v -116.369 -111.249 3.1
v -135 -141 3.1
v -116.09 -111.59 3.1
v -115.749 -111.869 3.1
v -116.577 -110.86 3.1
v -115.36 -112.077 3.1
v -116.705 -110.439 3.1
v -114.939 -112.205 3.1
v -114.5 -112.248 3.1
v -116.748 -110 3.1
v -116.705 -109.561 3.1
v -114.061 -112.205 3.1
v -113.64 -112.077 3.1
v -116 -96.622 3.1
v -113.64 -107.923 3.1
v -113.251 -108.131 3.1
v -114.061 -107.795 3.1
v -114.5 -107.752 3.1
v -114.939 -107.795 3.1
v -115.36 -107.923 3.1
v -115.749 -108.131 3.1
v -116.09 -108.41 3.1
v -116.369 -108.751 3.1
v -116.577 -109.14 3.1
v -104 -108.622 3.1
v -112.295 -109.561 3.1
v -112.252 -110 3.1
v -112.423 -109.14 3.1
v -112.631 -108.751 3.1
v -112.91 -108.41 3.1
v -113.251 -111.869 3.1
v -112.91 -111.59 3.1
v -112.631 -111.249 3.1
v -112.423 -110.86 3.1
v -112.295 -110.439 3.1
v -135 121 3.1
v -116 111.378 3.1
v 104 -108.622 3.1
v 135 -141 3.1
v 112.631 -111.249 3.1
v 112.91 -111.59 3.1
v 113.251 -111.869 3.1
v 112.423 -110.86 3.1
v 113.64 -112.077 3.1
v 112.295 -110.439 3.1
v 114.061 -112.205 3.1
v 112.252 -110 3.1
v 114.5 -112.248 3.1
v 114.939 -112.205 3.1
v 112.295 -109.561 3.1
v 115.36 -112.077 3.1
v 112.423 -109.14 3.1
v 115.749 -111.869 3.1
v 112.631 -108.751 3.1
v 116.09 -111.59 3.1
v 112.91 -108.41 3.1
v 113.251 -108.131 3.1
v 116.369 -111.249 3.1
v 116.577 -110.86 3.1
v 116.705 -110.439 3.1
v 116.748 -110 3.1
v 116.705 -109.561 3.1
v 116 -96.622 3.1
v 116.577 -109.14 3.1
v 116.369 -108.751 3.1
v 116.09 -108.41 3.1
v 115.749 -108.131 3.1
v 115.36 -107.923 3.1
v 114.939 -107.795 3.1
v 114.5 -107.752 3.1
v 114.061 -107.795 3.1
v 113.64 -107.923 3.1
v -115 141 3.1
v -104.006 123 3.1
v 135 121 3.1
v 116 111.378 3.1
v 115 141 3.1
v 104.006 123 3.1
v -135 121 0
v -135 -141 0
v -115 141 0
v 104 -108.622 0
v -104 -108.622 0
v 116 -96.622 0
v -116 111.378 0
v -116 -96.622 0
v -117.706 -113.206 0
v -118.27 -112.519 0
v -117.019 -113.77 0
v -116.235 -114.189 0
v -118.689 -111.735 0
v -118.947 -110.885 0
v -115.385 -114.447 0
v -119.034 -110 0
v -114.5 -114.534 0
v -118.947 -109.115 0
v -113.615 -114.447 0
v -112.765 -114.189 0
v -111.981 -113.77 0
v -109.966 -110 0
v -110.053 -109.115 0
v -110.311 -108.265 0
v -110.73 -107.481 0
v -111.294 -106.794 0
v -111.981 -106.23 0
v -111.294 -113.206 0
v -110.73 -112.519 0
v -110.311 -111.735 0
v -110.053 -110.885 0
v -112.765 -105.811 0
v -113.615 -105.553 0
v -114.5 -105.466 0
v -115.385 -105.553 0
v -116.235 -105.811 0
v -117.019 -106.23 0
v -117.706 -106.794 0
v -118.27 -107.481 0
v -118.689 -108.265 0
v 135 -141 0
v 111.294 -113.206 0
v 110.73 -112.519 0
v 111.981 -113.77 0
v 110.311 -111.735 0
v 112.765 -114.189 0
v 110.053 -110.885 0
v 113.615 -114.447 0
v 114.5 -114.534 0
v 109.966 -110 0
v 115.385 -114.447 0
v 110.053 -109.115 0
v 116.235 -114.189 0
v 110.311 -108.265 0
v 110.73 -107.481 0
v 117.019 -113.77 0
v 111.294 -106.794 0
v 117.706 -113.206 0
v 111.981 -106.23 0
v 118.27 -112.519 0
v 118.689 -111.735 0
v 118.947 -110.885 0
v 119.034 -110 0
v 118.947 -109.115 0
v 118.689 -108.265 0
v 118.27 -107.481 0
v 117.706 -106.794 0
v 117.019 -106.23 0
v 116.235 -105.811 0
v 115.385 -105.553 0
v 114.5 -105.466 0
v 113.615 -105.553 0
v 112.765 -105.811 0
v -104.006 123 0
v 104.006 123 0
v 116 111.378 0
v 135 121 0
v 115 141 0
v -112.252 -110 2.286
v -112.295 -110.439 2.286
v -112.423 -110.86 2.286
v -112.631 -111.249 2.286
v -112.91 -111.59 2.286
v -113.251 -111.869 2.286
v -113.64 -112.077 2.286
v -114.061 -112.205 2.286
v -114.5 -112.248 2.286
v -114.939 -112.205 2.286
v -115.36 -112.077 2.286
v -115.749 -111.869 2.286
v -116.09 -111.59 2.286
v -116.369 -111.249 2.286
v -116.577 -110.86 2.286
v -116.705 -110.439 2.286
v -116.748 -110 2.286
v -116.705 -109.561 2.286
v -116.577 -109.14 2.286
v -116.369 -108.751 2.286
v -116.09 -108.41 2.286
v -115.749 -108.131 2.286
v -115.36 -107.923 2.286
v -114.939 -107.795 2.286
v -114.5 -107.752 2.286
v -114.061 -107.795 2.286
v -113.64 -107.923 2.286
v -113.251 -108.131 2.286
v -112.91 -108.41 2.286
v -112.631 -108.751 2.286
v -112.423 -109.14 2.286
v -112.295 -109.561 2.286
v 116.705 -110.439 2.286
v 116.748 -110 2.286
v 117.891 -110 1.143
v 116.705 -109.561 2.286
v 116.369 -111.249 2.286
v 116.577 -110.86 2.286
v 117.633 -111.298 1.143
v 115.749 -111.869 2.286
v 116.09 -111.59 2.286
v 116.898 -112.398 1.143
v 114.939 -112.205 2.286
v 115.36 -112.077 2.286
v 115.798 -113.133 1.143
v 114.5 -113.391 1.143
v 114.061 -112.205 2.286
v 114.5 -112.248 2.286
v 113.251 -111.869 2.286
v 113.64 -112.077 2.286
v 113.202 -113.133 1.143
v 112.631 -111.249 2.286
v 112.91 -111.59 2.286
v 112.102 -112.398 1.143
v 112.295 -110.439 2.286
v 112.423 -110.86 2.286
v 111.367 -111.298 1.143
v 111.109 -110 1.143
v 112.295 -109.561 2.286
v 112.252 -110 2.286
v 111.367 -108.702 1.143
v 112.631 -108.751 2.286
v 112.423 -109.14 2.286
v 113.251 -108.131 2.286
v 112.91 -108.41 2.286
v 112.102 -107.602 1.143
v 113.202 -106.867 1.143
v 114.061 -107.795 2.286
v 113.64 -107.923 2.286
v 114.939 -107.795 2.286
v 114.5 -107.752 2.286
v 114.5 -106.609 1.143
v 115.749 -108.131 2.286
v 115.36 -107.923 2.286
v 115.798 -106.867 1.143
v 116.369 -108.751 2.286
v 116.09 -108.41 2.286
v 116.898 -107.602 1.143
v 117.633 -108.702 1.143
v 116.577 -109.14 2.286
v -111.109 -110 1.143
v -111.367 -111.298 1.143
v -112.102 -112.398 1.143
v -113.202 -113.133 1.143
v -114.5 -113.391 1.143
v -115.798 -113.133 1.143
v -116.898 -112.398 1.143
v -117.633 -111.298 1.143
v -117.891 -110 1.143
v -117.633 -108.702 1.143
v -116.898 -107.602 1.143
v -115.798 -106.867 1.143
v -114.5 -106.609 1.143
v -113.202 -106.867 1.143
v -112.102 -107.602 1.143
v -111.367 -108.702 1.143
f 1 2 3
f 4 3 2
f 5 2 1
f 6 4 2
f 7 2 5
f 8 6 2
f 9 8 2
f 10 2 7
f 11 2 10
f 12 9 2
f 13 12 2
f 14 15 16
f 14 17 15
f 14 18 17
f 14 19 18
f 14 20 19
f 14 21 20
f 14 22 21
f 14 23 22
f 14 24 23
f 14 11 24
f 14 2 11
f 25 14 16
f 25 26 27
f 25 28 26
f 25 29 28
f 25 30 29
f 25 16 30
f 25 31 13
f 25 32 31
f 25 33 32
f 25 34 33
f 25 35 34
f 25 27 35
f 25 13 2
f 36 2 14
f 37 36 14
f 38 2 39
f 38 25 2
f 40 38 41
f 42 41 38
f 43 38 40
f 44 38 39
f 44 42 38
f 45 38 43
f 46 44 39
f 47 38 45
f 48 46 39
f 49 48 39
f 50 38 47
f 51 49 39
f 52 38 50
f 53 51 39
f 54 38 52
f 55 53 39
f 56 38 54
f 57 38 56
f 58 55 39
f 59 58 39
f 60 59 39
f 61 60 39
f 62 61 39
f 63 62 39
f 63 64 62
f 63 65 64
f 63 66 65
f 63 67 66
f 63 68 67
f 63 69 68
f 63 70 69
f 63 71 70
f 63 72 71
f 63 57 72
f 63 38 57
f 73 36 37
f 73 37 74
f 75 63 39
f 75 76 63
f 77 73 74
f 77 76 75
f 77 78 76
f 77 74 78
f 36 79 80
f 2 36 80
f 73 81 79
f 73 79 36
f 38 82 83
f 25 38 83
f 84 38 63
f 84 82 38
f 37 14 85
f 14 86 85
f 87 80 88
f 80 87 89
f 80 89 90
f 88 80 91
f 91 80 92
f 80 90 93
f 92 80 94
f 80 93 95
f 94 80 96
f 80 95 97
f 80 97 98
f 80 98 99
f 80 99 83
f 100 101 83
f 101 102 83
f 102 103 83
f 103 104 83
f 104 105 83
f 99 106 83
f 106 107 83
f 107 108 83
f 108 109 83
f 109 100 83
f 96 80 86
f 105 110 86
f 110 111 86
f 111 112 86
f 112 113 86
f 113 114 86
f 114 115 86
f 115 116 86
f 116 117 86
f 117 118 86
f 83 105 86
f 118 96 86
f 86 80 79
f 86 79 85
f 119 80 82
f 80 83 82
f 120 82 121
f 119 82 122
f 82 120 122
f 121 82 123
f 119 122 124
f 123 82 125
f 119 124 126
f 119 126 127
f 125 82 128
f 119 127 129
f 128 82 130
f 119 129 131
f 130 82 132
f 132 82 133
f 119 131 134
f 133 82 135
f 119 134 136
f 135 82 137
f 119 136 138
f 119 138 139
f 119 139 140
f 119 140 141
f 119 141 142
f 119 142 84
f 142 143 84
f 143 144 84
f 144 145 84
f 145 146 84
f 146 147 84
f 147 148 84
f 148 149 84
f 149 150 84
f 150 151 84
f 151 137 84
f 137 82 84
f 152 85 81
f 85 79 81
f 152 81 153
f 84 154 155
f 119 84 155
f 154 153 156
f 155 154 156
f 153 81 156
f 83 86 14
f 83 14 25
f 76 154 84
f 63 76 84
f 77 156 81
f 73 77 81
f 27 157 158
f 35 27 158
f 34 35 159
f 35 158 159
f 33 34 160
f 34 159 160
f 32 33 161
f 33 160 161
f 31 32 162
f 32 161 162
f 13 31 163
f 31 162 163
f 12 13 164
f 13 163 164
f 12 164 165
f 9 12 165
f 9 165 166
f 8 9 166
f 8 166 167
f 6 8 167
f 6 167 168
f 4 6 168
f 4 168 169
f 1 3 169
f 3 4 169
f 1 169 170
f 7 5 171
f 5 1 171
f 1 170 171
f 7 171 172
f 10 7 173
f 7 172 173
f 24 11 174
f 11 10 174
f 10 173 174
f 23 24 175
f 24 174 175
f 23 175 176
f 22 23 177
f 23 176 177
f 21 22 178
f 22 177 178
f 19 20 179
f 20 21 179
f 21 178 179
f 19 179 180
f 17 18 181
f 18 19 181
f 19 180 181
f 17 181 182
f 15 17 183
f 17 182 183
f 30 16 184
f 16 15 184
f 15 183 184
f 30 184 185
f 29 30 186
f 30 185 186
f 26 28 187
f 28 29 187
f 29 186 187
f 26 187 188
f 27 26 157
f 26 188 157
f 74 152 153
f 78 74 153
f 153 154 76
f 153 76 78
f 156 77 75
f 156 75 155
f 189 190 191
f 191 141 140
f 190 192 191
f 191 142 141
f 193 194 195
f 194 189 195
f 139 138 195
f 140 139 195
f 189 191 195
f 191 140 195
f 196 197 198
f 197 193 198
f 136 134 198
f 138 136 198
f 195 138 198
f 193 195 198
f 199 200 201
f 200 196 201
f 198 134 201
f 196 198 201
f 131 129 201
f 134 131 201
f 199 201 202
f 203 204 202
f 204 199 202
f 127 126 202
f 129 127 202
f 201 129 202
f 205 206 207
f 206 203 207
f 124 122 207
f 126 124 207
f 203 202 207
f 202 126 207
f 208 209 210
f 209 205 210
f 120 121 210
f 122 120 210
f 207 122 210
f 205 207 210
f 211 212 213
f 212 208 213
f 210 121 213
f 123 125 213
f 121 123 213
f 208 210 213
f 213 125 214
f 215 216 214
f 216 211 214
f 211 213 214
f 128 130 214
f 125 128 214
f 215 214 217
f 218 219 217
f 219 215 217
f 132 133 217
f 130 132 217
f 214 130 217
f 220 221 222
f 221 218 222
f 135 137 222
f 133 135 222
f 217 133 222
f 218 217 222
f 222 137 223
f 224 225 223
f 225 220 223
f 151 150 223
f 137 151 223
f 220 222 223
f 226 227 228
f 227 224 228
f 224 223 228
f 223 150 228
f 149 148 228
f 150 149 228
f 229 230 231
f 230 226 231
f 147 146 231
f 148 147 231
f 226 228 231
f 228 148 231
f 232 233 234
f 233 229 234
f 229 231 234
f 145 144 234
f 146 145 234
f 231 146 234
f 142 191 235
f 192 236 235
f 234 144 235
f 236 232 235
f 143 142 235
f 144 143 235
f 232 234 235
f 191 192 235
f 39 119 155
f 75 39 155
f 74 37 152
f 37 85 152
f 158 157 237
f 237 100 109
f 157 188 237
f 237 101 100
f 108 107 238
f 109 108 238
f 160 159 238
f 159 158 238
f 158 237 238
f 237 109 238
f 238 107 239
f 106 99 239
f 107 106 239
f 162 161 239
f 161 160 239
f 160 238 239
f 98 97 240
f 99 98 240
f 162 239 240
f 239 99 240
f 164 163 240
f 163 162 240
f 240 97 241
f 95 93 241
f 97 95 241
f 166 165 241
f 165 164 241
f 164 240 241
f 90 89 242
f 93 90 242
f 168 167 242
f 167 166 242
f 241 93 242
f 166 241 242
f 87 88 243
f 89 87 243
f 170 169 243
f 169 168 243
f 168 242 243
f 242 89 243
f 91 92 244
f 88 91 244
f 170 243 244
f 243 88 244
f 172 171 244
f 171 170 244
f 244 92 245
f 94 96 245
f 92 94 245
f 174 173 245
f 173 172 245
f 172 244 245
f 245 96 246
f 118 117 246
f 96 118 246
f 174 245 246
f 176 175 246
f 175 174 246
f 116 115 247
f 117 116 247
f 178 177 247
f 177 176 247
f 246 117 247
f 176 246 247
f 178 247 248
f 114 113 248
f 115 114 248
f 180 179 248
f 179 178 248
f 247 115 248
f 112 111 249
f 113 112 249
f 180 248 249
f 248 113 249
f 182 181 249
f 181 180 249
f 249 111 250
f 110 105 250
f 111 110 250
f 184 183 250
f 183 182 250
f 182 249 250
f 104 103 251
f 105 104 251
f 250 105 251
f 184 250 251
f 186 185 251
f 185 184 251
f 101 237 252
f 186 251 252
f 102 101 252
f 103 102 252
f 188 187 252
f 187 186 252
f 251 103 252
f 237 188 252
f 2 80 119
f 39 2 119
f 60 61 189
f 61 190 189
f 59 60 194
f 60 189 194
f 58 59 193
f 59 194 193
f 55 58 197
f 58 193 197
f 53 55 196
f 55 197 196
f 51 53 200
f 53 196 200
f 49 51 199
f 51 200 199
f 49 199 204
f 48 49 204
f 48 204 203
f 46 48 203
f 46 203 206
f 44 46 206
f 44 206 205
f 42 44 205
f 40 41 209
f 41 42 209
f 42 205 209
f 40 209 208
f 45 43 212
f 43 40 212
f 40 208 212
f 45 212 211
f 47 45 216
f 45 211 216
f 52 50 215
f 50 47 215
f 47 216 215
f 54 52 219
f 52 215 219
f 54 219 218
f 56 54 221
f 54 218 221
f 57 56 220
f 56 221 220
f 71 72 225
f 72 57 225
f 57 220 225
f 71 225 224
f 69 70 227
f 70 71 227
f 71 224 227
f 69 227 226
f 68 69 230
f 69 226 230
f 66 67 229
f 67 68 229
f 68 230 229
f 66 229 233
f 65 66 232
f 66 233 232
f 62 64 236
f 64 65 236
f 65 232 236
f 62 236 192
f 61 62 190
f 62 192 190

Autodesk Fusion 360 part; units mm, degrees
sketch "Sketch1" plane through (0, 0, 0) normal (0, 0, 1) x (1, 0, 0)
  line L0 (135, 141) -> (-135, 141)
  line L1 (-135, 141) -> (-135, -141)
  line L2 (-135, -141) -> (135, -141)
  line L3 (135, -141) -> (135, 141)
  line L4 (135, 141) -> (-135, -141) construction
  line L5 (-135, 141) -> (135, -141) construction
  line L6 (-104.0059, 123) -> (104.0059, 123)
  line L7 (104, -108.6222) -> (-104, -108.6222)
  line L8 (-116, 111.3778) -> (-104.0059, 123)
  line L9 (-116, -96.6222) -> (-116, 111.3778)
  line L10 (-116, 121.1556) -> (-116, 123.3778)
  line L11 (0, 86.9957) -> (0, -79.0579) construction
  line L12 (116, 111.3778) -> (104.0059, 123)
  line L13 (116, 123.3776) -> (116, 121.1556)
  line L14 (116, 111.3778) -> (116, -96.6222)
  line L15 (-116, -96.6222) -> (-104, -108.6222)
  line L16 (104, -108.6222) -> (116, -96.6222)
  circle A0 centre (-114.5, -110) radius 2.2479
  circle A1 centre (114.5, -110) radius 2.2479
  dimension "d1" = 270
  dimension "d2" = 282
  dimension "d3" = 232
  dimension "d5" = 18
  dimension "d6" = 19
  dimension "d7" = 12
  dimension "d8" = 12
  dimension "d13" = 4.4958
  dimension "d14" = 4.4958
  dimension "d15" = 229
  dimension "d16" = 31
  dimension "d17" = 20.5
extrude "Extrude1" add sketch "Sketch1" along normal blind 3.1
chamfer "Chamfer1" distance 20 angle 45 2 edges at (135, 141, 1.55) (-135, 141, 1.55)
chamfer "Chamfer2" distance 2.286 angle 45 2 edges at (112.4042, -109.1871, 0) (-116.5958, -109.1871, 0)
equation "d6 = ( ( 270 - 232 ) / 2 ) * 1 mm"
equation "d17 = ( ( 270 - 229 ) / 2 ) * 1 mm"
